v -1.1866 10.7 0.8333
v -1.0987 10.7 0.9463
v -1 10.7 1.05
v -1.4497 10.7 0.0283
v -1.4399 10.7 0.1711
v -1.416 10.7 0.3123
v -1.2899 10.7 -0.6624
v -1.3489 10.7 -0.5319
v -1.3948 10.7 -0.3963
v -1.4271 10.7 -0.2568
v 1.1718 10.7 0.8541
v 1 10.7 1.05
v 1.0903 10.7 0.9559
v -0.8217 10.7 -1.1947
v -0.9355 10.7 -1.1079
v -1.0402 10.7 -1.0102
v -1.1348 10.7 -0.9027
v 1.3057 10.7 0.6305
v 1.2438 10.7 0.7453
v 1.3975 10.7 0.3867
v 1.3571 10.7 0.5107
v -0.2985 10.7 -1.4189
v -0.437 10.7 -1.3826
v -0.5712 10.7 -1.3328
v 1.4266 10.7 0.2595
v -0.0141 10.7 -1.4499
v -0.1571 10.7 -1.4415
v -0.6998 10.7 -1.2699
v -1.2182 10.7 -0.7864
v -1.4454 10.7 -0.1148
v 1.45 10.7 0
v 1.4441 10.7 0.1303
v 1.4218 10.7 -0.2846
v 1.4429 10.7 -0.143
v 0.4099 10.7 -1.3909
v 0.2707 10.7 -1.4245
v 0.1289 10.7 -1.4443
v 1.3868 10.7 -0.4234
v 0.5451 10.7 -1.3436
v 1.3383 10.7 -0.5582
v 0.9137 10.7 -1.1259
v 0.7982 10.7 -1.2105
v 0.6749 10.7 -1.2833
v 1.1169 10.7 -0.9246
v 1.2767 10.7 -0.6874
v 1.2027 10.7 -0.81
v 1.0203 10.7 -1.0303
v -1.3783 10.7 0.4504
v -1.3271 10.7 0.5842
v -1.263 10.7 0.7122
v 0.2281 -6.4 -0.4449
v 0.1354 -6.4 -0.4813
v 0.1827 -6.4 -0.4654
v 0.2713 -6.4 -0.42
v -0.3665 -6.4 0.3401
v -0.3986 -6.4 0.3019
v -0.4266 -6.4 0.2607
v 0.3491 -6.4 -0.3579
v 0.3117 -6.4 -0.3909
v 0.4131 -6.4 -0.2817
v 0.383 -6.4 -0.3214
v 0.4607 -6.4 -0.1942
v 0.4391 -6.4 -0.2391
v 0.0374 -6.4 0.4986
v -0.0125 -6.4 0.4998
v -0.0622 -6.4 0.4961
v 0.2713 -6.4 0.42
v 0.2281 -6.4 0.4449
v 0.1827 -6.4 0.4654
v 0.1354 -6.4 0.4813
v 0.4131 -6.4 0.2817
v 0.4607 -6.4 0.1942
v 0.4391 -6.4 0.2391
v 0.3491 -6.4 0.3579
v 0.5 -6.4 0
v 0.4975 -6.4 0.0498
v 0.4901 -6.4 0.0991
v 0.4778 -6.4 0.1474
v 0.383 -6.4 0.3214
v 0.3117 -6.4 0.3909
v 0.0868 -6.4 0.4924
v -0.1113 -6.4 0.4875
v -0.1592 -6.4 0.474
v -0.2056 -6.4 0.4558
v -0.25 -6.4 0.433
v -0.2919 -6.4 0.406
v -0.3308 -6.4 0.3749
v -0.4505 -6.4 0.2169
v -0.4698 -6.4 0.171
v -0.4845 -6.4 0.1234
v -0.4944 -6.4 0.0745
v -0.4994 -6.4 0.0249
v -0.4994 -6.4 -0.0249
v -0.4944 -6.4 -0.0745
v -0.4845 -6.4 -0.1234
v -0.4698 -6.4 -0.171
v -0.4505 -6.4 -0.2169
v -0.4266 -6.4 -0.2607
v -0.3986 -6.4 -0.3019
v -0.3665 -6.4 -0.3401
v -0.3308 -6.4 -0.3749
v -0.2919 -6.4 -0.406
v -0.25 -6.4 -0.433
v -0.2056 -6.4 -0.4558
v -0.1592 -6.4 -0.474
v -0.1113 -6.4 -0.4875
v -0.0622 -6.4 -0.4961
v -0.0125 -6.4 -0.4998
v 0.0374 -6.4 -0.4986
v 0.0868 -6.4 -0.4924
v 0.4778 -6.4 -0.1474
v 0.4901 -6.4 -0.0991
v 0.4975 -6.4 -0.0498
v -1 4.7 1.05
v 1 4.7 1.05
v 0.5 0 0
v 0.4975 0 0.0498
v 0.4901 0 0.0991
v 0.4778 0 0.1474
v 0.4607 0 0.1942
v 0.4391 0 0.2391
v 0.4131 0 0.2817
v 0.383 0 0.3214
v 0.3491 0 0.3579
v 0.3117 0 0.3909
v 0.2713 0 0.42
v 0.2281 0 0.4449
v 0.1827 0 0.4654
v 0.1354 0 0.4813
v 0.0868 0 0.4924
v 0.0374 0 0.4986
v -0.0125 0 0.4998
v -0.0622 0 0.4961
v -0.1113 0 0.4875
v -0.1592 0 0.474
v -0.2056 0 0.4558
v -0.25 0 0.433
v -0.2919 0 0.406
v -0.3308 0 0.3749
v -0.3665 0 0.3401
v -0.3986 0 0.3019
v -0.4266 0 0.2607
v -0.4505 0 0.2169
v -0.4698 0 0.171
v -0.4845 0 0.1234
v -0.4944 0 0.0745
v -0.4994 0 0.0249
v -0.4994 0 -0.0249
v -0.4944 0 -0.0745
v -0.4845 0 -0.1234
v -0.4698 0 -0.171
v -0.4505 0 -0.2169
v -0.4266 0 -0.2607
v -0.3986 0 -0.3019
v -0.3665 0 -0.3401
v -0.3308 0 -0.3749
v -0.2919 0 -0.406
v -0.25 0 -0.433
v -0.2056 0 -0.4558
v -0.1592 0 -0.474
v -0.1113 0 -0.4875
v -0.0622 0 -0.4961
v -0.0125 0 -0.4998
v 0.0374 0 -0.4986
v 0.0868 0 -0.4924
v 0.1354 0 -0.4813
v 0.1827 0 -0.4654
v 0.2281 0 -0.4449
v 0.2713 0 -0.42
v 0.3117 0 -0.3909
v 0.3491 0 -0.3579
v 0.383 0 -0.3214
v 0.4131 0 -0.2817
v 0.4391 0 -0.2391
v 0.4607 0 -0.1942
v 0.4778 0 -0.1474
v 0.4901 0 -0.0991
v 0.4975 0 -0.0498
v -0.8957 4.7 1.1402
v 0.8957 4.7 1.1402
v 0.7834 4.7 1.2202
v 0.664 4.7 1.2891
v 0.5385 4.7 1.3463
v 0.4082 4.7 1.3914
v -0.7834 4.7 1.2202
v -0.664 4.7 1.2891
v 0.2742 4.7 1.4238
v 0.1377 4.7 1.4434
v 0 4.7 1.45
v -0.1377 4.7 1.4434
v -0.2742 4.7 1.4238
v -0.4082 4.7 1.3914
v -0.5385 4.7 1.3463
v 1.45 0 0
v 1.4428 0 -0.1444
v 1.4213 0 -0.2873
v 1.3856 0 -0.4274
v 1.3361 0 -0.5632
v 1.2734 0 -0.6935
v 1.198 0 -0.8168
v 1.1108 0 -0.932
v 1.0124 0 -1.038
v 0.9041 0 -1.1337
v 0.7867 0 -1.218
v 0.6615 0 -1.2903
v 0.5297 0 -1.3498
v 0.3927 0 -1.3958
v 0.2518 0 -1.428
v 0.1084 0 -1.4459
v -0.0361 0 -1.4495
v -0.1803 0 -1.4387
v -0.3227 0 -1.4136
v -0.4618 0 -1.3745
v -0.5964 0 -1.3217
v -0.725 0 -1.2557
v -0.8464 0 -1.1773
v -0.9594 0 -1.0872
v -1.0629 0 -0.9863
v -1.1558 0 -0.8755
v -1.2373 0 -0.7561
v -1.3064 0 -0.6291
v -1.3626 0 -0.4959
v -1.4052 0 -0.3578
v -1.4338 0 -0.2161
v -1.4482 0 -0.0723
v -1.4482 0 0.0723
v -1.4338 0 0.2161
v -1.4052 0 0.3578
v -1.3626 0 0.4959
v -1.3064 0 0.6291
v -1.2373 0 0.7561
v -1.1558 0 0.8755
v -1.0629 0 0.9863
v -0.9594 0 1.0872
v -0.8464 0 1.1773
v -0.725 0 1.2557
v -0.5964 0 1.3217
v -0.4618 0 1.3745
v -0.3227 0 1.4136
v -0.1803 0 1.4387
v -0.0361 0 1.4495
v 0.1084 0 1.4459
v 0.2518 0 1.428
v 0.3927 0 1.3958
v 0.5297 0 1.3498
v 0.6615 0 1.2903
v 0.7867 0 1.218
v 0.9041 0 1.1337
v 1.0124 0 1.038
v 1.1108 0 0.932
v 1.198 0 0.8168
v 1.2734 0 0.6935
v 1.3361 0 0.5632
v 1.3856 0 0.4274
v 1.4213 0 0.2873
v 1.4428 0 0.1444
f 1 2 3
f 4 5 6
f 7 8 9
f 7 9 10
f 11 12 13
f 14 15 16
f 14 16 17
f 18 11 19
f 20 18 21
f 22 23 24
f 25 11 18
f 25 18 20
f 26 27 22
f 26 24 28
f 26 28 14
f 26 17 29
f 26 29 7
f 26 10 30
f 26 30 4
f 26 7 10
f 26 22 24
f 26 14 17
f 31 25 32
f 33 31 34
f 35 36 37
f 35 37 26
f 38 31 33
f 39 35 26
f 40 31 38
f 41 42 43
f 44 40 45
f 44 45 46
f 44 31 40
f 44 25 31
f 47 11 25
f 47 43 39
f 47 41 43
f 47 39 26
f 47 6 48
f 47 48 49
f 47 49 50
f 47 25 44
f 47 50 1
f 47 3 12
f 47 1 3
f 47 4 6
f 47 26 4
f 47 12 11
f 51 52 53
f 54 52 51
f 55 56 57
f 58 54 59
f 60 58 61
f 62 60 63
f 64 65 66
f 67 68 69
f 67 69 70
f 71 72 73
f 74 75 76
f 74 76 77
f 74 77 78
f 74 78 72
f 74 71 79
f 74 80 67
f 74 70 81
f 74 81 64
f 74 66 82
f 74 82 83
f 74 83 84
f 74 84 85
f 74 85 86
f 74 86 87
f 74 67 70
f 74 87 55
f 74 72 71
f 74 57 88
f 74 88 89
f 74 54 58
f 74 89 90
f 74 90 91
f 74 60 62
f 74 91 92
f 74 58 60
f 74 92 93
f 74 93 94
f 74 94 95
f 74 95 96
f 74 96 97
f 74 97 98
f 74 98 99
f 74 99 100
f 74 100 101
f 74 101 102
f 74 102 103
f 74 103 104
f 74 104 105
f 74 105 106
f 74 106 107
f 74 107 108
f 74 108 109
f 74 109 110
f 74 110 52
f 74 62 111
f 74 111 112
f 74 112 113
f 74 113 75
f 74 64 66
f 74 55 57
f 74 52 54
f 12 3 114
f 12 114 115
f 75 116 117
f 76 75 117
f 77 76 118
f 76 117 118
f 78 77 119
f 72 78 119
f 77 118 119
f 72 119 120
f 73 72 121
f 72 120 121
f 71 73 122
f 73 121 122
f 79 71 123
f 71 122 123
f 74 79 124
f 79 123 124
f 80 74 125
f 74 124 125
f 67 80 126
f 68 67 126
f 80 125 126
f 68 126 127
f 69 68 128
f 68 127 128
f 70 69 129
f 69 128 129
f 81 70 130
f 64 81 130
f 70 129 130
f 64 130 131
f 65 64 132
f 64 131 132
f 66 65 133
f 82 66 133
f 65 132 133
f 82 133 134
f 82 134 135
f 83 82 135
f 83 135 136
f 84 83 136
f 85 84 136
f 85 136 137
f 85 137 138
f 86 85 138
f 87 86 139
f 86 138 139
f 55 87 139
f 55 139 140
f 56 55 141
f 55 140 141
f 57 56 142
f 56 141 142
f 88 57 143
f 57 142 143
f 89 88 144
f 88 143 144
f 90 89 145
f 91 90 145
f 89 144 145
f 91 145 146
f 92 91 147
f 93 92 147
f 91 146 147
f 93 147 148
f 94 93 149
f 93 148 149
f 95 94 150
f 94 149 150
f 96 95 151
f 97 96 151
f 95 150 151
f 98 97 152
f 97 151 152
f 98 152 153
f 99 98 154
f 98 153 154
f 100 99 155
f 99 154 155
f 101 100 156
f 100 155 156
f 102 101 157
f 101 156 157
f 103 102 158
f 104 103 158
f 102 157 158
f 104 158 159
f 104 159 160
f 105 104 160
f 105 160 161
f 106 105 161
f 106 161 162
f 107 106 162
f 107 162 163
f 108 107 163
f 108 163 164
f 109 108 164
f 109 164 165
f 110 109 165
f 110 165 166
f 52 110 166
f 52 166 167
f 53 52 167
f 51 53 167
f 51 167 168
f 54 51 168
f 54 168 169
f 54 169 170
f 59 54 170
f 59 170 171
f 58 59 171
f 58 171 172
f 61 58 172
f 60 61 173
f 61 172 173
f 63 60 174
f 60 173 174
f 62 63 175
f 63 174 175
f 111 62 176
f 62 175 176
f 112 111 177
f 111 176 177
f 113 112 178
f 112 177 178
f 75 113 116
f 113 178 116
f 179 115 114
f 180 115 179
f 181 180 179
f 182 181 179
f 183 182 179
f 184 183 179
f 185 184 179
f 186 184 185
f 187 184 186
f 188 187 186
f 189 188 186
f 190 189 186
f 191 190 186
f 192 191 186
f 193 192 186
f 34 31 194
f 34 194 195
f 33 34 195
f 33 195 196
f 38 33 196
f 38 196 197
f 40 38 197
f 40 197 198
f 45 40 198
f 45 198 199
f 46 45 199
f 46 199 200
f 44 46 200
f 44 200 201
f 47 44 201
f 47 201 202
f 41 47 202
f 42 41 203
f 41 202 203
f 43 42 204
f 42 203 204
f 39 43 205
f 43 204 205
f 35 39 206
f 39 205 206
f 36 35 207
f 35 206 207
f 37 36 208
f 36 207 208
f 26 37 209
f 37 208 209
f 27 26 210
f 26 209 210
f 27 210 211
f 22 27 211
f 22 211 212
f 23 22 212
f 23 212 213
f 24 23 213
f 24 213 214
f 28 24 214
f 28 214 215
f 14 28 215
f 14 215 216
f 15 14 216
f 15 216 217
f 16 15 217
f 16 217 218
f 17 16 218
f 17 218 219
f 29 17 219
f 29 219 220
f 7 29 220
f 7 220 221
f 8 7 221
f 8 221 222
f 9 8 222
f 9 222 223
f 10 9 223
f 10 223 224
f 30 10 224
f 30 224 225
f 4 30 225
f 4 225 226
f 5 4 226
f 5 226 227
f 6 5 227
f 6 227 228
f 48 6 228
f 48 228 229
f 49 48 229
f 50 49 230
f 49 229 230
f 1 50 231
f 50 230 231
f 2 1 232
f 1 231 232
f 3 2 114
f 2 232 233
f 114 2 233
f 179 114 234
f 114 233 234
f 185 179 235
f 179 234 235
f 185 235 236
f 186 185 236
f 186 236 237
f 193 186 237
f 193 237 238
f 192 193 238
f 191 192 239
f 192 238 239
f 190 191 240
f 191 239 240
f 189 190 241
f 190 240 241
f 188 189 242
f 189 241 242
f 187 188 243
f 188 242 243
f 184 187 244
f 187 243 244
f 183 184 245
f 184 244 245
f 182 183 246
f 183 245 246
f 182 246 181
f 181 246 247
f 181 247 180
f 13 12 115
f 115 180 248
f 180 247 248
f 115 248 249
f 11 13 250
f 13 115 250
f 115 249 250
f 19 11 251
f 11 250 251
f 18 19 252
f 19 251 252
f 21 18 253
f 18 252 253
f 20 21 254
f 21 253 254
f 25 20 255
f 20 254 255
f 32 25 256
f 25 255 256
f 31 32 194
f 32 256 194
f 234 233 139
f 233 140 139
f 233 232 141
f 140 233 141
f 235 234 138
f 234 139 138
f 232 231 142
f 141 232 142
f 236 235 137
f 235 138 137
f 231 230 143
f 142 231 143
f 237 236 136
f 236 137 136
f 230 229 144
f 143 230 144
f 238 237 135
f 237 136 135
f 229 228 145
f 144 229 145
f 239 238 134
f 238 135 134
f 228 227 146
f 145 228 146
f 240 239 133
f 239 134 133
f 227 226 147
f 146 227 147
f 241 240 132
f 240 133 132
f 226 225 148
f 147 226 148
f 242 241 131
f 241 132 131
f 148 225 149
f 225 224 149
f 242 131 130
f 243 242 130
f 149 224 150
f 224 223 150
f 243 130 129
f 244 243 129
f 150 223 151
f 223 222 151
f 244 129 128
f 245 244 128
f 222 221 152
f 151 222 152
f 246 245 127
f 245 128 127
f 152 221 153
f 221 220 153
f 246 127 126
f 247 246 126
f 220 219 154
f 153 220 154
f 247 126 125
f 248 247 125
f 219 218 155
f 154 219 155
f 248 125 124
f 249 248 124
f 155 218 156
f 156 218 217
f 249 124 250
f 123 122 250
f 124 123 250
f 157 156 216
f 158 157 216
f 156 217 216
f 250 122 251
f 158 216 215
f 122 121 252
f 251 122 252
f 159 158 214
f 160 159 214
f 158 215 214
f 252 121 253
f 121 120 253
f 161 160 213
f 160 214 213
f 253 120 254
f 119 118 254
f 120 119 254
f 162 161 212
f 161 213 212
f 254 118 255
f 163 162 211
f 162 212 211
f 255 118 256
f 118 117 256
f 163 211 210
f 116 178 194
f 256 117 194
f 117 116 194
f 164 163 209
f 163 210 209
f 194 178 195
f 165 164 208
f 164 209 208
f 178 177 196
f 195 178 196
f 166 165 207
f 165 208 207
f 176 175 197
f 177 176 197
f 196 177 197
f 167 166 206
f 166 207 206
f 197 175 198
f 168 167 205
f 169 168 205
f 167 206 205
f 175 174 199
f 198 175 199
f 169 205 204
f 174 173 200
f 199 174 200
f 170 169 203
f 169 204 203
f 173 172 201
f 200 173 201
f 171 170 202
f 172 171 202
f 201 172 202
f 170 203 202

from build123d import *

# Parameters (mm, degrees)
CROQUIS1_R              = 1.45
SALIENTE_EXTRUIR1_DEPTH = 10.7
CORTAR_EXTRUIR1_DEPTH   = 6
CROQUIS3_R              = 0.5
SALIENTE_EXTRUIR2_DEPTH = 6.4


with BuildPart() as part:
    # Croquis1 → Saliente-Extruir1 (new body)
    with BuildSketch(Plane(origin=(0, 0, 0), x_dir=(1, 0, 0), z_dir=(0, 1, 0))):
        Circle(CROQUIS1_R)
    extrude(amount=SALIENTE_EXTRUIR1_DEPTH)

    # Croquis2 → Cortar-Extruir1 (cut)
    with BuildSketch(Plane(origin=(0, 10.7, 0), x_dir=(1, 0, 0), z_dir=(0, 1, 0))):
        with BuildLine():
            Line((-1, -1.05), (1, -1.05))
            ThreePointArc((1, -1.05), (0, -1.45), (-1, -1.05))
        make_face()
    extrude(amount=-CORTAR_EXTRUIR1_DEPTH, mode=Mode.SUBTRACT)

    # Croquis3 → Saliente-Extruir2 (add)
    with BuildSketch(Plane.XZ):
        Circle(CROQUIS3_R)
    extrude(amount=SALIENTE_EXTRUIR2_DEPTH)


solid = part.part
